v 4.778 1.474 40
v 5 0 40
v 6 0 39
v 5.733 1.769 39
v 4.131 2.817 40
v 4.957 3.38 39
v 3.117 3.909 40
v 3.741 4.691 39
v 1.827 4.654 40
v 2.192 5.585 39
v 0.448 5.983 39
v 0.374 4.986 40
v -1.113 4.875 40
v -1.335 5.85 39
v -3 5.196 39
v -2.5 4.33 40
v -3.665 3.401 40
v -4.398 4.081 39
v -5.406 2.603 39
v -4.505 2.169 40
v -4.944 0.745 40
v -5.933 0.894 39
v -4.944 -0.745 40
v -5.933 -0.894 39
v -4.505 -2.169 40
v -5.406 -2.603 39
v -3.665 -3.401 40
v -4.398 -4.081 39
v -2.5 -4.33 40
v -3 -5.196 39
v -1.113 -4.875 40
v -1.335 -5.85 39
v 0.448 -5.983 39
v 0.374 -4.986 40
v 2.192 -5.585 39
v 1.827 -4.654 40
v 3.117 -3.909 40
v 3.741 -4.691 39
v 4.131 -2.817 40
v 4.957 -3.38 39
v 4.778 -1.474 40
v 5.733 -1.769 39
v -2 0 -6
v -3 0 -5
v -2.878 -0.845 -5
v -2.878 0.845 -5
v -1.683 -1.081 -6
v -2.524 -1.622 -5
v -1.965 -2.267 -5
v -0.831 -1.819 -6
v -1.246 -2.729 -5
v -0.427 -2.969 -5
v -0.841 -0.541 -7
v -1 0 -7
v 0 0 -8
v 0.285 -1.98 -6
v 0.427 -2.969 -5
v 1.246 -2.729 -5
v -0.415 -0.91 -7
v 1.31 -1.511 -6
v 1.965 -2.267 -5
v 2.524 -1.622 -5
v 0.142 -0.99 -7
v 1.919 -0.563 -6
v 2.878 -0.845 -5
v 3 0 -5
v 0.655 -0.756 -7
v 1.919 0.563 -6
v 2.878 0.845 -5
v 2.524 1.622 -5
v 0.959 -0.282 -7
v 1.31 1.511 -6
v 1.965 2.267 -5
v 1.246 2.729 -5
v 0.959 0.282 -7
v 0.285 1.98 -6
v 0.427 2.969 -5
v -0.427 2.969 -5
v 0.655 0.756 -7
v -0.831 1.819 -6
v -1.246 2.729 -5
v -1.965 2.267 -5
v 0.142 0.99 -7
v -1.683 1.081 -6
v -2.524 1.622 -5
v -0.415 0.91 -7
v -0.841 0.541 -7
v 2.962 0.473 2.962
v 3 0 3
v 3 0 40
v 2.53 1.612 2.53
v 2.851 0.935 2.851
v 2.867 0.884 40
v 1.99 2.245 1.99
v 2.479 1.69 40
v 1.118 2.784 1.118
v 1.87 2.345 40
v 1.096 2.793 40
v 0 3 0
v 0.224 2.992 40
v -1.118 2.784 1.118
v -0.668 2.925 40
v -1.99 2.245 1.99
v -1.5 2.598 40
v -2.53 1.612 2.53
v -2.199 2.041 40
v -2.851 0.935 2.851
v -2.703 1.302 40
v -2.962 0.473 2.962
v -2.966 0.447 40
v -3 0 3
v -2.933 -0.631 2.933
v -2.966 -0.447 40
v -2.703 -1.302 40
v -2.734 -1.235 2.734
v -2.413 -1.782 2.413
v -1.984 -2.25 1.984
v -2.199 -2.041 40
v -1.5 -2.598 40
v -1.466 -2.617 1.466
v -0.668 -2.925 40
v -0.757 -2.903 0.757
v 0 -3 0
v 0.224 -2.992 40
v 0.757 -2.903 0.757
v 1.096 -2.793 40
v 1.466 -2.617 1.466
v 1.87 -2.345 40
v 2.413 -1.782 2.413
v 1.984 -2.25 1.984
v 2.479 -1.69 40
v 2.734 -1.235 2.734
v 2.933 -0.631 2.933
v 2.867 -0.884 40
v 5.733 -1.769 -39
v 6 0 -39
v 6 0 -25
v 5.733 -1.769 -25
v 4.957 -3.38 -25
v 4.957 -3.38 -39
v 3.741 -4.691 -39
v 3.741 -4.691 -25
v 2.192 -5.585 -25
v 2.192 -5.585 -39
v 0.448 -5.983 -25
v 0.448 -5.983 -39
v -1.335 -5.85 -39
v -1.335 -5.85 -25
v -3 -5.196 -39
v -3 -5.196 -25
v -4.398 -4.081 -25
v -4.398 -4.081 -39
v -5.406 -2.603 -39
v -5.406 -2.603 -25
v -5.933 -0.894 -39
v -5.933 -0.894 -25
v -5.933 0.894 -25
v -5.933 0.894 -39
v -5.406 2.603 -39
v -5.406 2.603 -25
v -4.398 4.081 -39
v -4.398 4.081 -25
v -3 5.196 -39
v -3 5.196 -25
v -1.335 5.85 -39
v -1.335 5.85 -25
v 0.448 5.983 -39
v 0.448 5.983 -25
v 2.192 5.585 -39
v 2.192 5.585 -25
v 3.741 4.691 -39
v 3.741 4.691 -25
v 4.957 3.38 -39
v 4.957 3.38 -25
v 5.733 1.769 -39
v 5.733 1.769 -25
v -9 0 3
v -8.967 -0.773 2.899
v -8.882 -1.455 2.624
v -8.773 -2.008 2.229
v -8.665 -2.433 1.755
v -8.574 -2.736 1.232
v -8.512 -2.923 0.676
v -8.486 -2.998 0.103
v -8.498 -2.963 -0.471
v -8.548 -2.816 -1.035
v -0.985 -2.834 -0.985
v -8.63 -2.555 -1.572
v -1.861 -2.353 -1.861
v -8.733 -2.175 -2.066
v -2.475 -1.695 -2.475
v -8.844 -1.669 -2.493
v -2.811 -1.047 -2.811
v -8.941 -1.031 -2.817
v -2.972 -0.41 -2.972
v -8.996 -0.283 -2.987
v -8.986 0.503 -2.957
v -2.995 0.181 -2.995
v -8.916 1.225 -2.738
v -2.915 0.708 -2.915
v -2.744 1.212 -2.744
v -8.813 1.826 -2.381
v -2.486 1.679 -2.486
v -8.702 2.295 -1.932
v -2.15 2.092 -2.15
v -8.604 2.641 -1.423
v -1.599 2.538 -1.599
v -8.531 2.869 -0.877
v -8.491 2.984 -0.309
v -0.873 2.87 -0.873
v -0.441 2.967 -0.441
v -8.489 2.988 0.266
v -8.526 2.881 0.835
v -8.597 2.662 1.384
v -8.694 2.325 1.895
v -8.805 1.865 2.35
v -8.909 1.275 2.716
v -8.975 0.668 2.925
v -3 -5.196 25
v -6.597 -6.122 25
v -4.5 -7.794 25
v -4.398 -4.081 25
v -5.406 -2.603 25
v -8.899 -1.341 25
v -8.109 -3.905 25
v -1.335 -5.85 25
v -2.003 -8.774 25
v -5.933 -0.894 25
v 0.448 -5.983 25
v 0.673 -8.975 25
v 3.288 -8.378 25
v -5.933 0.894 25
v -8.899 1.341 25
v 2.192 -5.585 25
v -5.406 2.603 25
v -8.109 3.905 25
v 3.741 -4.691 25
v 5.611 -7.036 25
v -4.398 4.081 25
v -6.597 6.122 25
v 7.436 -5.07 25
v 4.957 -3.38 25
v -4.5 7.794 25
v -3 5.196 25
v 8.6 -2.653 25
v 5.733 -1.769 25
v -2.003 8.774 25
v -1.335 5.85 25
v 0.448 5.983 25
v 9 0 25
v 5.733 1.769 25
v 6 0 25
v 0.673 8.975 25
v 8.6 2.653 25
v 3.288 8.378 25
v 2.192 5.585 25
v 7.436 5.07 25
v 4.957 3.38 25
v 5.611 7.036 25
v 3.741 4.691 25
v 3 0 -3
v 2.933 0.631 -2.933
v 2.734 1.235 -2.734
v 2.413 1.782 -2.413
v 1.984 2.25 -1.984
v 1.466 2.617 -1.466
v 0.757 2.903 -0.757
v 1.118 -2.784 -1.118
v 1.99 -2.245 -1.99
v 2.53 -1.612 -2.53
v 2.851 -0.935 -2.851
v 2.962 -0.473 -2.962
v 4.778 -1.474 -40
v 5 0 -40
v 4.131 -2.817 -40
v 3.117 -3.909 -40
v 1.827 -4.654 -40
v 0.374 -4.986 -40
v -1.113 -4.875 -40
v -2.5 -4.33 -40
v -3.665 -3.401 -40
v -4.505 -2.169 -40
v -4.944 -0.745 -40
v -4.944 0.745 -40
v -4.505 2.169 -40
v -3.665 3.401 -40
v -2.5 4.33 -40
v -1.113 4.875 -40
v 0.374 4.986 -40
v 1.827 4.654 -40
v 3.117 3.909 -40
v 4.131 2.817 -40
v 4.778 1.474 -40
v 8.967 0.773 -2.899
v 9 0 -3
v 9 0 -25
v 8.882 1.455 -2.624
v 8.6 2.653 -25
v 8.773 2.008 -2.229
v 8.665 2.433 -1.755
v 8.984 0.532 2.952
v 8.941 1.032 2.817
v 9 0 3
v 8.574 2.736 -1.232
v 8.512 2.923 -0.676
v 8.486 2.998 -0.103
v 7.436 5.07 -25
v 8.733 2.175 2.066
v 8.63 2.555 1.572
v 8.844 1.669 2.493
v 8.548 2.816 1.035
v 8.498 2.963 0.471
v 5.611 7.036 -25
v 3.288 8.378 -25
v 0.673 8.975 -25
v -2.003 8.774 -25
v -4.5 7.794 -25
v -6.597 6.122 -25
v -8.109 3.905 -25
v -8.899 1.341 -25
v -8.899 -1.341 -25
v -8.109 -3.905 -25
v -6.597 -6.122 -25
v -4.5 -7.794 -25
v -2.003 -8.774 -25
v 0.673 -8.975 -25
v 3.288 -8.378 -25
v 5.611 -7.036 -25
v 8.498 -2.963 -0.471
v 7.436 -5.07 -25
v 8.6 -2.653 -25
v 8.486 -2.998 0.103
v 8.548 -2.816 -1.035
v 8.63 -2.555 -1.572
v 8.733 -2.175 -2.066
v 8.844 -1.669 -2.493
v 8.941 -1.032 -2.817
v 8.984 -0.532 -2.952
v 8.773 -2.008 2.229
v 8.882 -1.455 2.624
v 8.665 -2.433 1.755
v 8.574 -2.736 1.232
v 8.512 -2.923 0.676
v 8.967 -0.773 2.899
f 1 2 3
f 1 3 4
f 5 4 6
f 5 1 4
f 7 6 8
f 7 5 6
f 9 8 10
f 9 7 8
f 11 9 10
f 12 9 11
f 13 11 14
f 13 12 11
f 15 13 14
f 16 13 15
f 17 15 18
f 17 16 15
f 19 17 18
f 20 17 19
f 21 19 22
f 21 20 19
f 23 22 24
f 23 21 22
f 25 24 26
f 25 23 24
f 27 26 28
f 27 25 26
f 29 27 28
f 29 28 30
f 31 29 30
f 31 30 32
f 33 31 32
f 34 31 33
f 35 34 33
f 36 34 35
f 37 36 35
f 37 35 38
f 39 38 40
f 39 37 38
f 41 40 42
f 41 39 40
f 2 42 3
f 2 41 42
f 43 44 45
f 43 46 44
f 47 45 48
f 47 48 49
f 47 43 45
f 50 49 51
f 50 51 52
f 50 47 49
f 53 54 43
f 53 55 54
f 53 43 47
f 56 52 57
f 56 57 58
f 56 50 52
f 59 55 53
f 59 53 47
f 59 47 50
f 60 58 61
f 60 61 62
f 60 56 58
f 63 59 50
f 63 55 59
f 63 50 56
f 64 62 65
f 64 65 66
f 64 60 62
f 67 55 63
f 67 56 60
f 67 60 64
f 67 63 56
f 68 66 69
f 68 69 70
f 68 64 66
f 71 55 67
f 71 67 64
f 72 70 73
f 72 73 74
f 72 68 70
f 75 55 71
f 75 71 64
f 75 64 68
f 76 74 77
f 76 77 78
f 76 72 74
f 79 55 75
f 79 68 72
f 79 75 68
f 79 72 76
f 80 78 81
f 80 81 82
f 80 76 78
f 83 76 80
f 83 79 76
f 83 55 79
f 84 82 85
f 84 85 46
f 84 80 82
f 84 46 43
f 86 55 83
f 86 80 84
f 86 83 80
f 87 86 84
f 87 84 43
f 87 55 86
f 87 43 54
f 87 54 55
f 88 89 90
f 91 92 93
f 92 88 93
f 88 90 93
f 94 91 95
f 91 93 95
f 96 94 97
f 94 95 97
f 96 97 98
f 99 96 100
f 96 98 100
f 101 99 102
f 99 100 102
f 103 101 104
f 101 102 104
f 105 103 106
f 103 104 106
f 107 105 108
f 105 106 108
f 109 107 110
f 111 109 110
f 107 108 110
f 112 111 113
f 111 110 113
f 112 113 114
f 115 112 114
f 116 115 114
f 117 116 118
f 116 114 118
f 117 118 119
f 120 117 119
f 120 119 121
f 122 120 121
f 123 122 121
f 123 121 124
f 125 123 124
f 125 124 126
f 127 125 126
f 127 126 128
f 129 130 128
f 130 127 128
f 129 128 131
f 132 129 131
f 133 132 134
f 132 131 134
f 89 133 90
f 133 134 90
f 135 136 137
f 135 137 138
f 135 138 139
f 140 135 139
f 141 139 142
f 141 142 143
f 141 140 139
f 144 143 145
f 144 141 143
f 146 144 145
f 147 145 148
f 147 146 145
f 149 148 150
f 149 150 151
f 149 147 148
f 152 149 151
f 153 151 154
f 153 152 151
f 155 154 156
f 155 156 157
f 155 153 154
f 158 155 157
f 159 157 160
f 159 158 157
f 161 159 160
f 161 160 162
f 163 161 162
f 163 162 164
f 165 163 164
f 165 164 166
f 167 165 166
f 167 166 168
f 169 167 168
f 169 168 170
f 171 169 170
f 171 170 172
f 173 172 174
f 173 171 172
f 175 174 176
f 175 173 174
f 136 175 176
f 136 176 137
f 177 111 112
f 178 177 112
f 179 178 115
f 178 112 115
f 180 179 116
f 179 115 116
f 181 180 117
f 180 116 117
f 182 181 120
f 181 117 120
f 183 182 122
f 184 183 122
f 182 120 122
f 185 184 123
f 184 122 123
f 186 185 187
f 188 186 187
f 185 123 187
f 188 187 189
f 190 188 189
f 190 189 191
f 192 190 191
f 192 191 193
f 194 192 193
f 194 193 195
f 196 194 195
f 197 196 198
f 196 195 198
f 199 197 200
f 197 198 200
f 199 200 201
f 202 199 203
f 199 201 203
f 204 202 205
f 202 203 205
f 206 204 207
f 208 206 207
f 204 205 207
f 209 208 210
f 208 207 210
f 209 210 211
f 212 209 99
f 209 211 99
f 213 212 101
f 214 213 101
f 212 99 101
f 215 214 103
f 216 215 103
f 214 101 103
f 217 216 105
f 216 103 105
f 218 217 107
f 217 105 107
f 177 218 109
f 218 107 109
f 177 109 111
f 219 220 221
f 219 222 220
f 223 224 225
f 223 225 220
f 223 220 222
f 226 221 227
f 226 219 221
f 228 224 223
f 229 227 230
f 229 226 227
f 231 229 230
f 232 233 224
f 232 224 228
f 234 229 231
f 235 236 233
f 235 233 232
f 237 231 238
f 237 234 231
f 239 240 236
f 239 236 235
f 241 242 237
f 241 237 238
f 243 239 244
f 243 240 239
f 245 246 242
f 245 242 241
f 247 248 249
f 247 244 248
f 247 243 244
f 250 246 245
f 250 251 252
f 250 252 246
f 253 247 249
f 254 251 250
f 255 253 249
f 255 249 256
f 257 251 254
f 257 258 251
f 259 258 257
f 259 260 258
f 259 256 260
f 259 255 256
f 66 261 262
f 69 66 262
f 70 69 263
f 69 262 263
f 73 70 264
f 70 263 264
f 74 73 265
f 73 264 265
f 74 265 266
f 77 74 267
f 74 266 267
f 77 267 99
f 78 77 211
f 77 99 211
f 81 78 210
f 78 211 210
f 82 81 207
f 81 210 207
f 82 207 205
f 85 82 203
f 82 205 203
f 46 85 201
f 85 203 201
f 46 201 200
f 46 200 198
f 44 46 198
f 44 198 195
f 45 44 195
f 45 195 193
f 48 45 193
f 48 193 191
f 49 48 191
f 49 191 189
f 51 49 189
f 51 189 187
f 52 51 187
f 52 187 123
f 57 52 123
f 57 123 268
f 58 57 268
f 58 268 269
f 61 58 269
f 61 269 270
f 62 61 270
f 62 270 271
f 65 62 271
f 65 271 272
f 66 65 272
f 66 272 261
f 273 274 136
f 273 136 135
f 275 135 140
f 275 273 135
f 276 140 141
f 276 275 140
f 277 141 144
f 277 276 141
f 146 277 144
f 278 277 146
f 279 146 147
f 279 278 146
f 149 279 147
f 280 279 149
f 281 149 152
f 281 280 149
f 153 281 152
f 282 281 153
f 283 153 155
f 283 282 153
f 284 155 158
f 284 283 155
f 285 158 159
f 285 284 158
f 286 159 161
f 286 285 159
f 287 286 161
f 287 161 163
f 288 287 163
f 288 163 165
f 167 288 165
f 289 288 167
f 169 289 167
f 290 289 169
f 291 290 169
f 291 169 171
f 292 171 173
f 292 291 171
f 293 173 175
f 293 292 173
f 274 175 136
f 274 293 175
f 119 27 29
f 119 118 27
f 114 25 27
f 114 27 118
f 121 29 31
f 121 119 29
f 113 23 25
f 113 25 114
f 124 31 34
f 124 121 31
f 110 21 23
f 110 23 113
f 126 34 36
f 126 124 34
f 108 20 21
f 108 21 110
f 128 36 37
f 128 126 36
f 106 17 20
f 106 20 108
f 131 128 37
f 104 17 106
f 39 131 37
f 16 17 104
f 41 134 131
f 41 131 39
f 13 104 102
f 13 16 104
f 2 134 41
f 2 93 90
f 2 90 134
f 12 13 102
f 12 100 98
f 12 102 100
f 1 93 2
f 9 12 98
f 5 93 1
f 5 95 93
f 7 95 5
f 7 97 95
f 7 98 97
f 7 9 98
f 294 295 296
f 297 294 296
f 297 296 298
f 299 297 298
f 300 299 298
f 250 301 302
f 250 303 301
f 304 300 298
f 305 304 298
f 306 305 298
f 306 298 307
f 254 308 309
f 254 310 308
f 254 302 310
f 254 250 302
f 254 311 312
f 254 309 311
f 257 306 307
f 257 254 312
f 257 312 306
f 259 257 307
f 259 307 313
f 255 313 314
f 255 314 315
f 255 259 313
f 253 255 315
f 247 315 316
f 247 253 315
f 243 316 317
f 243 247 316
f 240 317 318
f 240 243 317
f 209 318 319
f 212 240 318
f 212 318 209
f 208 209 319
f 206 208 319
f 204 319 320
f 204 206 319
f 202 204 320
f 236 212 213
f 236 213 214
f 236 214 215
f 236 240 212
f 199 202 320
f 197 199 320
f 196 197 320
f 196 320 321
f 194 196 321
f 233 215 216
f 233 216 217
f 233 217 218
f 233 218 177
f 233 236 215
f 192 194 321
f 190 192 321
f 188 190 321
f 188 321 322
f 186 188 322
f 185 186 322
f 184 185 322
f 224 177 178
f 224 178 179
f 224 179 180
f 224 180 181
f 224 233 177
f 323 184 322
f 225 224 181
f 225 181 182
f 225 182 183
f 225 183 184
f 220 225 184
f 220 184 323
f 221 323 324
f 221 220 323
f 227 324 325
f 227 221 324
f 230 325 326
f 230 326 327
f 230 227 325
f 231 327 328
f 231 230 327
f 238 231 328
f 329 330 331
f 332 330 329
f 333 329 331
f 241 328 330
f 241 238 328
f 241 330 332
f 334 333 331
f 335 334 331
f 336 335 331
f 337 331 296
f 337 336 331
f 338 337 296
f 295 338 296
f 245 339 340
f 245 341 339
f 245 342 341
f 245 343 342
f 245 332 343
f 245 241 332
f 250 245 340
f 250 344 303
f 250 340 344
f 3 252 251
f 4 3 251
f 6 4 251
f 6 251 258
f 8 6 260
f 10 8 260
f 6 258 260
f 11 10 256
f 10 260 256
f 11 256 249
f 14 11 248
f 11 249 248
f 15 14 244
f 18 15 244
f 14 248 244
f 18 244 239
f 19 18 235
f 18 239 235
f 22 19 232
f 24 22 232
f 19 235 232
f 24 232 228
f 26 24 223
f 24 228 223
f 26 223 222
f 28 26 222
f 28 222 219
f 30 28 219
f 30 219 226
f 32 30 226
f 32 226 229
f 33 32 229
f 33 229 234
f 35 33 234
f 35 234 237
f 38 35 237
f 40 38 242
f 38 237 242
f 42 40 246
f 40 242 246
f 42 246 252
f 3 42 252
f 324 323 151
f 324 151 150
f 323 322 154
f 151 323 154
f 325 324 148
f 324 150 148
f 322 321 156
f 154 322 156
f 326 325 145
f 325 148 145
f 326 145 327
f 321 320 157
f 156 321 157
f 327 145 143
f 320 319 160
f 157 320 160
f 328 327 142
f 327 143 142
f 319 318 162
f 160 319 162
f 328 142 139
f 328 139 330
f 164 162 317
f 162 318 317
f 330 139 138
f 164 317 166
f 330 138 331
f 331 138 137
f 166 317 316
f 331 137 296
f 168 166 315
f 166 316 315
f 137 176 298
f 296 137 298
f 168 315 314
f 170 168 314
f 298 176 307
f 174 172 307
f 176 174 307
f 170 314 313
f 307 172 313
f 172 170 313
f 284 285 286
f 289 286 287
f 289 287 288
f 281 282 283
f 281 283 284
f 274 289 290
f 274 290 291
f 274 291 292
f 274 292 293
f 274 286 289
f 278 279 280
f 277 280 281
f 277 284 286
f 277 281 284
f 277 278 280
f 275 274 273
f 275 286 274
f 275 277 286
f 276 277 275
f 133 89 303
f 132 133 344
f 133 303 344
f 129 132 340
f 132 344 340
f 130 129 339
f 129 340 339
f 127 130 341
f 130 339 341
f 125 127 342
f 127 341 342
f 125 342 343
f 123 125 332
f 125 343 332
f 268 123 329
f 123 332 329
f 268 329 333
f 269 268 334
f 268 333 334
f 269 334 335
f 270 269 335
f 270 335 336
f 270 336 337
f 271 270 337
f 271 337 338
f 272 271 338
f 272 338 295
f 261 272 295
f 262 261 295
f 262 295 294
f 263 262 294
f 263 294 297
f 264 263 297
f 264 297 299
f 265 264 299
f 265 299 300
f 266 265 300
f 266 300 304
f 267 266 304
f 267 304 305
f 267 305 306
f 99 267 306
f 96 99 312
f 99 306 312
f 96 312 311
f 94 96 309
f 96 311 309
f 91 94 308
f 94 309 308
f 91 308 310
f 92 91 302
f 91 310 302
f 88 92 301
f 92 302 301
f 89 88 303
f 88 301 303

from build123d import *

# Parameters (mm, degrees)
SKETCH2_R           = 9
BOSS_EXTRUDE1_DEPTH = 25
SKETCH3_R           = 6
BOSS_EXTRUDE2_DEPTH = 15
BOSS_EXTRUDE4_START = 15
SKETCH4_R           = 6
BOSS_EXTRUDE4_DEPTH = 15
SKETCH5_R           = 3
CUT_EXTRUDE1_DEPTH  = 10
SKETCH6_R           = 3
CUT_EXTRUDE2_DEPTH  = 45
CHAMFER1_SIZE       = 1
CHAMFER2_SIZE       = 1


with BuildPart() as part:
    # Sketch2 → Boss-Extrude1 (new, symmetric)
    with BuildSketch(Plane.XY):
        Circle(SKETCH2_R)
    extrude(amount=BOSS_EXTRUDE1_DEPTH, both=True)

    # Sketch3 → Boss-Extrude2 (add)
    with BuildSketch(Plane.XY.offset(25)):
        Circle(SKETCH3_R)
    extrude(amount=BOSS_EXTRUDE2_DEPTH)

    # Sketch4 → Boss-Extrude4 (add)
    with BuildSketch(Plane(origin=(0, 0, -25), x_dir=(-1, 0, 0), z_dir=(0, 0, -1)).offset(BOSS_EXTRUDE4_START)):
        with Locations(Location((0, 0, 0), (0, 0, 180))):
            Circle(SKETCH4_R)
    extrude(amount=-BOSS_EXTRUDE4_DEPTH)

    # Sketch5 → Cut-Extrude1 (cut, symmetric)
    with BuildSketch(Plane(origin=(0, 0, 0), x_dir=(0, 0, -1), z_dir=(1, 0, 0))):
        with Locations(Location((0, 0, 0), (0, 0, 180))):
            Circle(SKETCH5_R)
    extrude(amount=CUT_EXTRUDE1_DEPTH, both=True, mode=Mode.SUBTRACT)

    # Sketch6 → Cut-Extrude2 (cut)
    with BuildSketch(Plane.XY.offset(40)):
        Circle(SKETCH6_R)
    extrude(amount=-CUT_EXTRUDE2_DEPTH, mode=Mode.SUBTRACT)

    # Sketch7 → Cut-Revolve1 (revolve, cut)
    with BuildSketch(Plane(origin=(0, 0, 0), x_dir=(1, 0, 0), z_dir=(0, 1, 0))):
        Polygon((-3, 5), (0, 8), (0, 5), align=None)
    revolve(axis=Axis((0, 0, -10.064608653), (0, 0, 1)), mode=Mode.SUBTRACT)

    # Chamfer1
    chamfer1_edges = [part.edges().sort_by_distance(p)[0] for p in [
        (-6, 0, 40),
    ]]
    chamfer(chamfer1_edges, length=CHAMFER1_SIZE)

    # Chamfer2
    chamfer2_edges = [part.edges().sort_by_distance(p)[0] for p in [
        (-6, 0, -40),
    ]]
    chamfer(chamfer2_edges, length=CHAMFER2_SIZE)


solid = part.part
